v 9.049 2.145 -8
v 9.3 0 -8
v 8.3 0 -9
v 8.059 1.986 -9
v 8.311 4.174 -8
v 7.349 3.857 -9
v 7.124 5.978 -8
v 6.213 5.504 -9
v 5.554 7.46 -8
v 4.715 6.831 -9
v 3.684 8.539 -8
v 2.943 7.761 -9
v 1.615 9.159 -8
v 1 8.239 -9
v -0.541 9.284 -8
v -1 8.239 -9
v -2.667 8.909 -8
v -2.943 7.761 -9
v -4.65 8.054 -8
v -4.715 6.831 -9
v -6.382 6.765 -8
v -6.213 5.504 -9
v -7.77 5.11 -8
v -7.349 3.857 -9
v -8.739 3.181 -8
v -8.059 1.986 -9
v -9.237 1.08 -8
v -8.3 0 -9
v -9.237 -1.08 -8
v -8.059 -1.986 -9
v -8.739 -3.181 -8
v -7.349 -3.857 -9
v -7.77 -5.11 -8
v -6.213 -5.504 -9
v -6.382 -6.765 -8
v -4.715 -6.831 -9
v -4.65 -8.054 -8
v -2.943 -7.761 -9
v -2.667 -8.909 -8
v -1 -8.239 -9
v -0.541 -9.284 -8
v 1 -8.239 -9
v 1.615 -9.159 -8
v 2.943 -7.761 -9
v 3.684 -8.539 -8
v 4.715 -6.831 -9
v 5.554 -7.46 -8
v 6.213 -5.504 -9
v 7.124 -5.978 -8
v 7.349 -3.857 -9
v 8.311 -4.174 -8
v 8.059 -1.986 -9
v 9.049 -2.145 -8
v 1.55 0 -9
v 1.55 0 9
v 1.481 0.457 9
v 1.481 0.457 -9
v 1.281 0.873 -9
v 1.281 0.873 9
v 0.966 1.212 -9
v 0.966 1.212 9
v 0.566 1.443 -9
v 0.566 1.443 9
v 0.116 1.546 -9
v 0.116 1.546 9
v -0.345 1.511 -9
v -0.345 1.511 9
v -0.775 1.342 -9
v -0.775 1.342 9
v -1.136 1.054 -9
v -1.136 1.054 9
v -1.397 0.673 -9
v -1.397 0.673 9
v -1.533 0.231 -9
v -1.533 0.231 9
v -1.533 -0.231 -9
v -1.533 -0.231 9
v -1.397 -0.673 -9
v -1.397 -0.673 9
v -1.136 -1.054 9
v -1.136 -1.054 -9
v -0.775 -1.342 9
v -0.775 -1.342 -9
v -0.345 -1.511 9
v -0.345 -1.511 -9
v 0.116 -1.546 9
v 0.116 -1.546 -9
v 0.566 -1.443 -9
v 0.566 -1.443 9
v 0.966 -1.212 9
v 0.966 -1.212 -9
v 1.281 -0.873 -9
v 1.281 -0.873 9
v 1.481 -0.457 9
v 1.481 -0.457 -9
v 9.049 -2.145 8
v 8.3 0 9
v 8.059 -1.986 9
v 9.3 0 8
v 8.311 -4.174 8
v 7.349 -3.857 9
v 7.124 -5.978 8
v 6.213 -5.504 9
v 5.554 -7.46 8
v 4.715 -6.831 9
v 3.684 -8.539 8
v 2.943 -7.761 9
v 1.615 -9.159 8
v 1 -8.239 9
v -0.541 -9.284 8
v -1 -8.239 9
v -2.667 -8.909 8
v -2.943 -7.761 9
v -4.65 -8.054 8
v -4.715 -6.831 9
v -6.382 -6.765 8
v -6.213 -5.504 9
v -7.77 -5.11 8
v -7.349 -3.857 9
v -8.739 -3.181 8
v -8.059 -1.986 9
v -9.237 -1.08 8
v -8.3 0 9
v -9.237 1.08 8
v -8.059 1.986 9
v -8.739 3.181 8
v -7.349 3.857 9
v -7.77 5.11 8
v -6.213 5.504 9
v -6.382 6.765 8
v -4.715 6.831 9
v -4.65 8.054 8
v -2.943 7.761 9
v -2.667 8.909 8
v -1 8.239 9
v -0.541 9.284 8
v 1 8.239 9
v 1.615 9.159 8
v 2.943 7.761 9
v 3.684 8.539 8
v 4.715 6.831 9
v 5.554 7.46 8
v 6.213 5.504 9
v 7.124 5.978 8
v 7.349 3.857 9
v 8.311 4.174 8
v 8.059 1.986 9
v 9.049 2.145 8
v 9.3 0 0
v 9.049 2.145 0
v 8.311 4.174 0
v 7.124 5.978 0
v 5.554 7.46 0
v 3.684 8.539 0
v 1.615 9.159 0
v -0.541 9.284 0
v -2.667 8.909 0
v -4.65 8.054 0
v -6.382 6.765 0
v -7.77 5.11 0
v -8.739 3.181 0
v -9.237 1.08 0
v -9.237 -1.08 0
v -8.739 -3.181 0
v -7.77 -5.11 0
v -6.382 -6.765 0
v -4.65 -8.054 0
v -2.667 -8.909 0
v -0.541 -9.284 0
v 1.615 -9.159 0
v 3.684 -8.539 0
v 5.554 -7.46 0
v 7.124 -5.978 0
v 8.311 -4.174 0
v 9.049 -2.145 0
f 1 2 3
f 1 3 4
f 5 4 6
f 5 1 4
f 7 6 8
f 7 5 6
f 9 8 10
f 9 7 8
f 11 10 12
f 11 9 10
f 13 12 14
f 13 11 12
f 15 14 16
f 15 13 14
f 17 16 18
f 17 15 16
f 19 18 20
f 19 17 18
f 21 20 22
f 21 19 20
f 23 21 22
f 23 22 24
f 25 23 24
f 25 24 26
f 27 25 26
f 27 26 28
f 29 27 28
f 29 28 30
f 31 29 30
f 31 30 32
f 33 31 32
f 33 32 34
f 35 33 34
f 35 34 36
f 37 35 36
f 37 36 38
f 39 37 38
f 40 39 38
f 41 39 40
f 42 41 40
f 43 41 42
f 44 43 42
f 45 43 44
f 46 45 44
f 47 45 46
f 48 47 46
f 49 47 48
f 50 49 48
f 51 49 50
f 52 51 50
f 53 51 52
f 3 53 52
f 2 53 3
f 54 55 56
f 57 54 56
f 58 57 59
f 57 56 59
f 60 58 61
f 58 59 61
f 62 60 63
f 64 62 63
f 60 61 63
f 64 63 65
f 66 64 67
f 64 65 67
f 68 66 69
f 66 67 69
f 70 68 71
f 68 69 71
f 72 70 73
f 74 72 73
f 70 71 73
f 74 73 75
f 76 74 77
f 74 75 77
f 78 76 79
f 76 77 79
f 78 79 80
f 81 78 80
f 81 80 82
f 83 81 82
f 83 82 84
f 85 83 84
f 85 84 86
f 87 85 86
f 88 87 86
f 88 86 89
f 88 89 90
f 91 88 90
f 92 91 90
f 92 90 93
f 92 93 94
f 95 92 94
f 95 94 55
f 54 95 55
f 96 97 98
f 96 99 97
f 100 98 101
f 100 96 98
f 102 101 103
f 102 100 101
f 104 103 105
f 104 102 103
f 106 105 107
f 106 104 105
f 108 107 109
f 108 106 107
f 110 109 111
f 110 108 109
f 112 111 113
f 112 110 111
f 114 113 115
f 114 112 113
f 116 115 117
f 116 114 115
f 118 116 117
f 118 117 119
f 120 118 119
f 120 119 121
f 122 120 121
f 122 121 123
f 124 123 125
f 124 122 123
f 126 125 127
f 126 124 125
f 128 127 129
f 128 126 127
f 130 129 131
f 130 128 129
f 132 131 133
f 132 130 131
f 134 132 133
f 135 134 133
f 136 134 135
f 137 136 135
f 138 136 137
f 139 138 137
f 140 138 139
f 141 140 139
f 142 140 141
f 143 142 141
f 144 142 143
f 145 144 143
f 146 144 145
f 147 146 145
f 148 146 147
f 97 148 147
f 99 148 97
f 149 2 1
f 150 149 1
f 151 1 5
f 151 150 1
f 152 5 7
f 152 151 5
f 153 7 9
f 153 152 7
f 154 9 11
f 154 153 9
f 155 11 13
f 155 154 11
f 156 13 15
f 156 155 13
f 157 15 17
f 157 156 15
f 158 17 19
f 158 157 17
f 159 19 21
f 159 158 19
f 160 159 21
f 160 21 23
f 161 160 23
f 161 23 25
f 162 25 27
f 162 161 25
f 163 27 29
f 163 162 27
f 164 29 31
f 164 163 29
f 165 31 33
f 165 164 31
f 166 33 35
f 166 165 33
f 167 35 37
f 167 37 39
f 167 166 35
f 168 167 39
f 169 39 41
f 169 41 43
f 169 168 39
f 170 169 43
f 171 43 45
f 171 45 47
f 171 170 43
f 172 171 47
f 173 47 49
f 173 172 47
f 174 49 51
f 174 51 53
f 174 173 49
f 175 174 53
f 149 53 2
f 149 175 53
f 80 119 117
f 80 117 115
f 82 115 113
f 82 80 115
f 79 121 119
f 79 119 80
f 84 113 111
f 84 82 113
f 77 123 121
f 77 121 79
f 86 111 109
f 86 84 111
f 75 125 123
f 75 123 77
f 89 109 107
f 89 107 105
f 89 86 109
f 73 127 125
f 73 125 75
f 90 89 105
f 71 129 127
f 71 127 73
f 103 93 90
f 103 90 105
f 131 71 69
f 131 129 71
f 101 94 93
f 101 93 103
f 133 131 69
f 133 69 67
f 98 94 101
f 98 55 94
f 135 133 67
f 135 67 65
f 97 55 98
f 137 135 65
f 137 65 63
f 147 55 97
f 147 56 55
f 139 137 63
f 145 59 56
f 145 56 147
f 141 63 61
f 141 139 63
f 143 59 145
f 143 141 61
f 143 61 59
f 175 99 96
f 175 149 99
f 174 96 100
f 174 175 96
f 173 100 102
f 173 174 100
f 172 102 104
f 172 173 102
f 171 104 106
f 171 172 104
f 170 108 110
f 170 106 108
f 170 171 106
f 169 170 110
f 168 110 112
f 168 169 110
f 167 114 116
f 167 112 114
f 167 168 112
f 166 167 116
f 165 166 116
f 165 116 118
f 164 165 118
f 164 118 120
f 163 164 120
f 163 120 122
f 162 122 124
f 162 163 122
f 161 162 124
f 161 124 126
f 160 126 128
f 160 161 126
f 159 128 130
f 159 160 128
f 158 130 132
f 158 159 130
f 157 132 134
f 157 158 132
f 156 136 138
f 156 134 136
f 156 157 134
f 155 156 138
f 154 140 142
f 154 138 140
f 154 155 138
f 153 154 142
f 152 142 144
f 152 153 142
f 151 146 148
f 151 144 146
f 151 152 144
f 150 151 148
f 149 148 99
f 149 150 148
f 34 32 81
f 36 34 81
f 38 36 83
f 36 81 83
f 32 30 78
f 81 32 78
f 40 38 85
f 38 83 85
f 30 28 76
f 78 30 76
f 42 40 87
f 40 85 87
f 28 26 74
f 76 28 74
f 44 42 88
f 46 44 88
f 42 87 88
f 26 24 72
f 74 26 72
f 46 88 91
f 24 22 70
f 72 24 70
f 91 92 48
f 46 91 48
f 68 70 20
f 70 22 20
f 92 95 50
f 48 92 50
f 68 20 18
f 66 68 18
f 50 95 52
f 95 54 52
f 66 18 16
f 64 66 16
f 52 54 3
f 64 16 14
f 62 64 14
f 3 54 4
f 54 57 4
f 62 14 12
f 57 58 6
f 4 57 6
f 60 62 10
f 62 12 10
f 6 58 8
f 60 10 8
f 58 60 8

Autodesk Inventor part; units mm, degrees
ref_plane "YZ Plane" through (0, 0, 0) normal (1, 0, 0) x (0, 1, 0)
ref_plane "XZ Plane" through (0, 0, 0) normal (0, 1, 0) x (-1, 0, 0)
ref_plane "XY Plane" through (0, 0, 0) normal (0, 0, 1) x (1, 0, 0)
sketch "Sketch1" plane through (0, 0, 0) normal (0, 0, 1) x (1, 0, 0)
  circle A0 centre (0, 0) radius 9.3
  dimension "d0" = 18.6
extrude "Extrusion1" add sketch "Sketch1" along normal mid plane 18
chamfer "Chamfer1" distance 1 angle 45 2 edges at (-9.3, 0, 9) (-9.3, 0, -9)
sketch "Sketch2" plane through (0, 0, 9) normal (0, 0, 1) x (1, 0, 0)
  circle A0 centre (0, 0) radius 1.55
  dimension "d6" = 3.1
extrude "Extrusion2" cut sketch "Sketch2" against normal blind 18
properties part number "Roller"
